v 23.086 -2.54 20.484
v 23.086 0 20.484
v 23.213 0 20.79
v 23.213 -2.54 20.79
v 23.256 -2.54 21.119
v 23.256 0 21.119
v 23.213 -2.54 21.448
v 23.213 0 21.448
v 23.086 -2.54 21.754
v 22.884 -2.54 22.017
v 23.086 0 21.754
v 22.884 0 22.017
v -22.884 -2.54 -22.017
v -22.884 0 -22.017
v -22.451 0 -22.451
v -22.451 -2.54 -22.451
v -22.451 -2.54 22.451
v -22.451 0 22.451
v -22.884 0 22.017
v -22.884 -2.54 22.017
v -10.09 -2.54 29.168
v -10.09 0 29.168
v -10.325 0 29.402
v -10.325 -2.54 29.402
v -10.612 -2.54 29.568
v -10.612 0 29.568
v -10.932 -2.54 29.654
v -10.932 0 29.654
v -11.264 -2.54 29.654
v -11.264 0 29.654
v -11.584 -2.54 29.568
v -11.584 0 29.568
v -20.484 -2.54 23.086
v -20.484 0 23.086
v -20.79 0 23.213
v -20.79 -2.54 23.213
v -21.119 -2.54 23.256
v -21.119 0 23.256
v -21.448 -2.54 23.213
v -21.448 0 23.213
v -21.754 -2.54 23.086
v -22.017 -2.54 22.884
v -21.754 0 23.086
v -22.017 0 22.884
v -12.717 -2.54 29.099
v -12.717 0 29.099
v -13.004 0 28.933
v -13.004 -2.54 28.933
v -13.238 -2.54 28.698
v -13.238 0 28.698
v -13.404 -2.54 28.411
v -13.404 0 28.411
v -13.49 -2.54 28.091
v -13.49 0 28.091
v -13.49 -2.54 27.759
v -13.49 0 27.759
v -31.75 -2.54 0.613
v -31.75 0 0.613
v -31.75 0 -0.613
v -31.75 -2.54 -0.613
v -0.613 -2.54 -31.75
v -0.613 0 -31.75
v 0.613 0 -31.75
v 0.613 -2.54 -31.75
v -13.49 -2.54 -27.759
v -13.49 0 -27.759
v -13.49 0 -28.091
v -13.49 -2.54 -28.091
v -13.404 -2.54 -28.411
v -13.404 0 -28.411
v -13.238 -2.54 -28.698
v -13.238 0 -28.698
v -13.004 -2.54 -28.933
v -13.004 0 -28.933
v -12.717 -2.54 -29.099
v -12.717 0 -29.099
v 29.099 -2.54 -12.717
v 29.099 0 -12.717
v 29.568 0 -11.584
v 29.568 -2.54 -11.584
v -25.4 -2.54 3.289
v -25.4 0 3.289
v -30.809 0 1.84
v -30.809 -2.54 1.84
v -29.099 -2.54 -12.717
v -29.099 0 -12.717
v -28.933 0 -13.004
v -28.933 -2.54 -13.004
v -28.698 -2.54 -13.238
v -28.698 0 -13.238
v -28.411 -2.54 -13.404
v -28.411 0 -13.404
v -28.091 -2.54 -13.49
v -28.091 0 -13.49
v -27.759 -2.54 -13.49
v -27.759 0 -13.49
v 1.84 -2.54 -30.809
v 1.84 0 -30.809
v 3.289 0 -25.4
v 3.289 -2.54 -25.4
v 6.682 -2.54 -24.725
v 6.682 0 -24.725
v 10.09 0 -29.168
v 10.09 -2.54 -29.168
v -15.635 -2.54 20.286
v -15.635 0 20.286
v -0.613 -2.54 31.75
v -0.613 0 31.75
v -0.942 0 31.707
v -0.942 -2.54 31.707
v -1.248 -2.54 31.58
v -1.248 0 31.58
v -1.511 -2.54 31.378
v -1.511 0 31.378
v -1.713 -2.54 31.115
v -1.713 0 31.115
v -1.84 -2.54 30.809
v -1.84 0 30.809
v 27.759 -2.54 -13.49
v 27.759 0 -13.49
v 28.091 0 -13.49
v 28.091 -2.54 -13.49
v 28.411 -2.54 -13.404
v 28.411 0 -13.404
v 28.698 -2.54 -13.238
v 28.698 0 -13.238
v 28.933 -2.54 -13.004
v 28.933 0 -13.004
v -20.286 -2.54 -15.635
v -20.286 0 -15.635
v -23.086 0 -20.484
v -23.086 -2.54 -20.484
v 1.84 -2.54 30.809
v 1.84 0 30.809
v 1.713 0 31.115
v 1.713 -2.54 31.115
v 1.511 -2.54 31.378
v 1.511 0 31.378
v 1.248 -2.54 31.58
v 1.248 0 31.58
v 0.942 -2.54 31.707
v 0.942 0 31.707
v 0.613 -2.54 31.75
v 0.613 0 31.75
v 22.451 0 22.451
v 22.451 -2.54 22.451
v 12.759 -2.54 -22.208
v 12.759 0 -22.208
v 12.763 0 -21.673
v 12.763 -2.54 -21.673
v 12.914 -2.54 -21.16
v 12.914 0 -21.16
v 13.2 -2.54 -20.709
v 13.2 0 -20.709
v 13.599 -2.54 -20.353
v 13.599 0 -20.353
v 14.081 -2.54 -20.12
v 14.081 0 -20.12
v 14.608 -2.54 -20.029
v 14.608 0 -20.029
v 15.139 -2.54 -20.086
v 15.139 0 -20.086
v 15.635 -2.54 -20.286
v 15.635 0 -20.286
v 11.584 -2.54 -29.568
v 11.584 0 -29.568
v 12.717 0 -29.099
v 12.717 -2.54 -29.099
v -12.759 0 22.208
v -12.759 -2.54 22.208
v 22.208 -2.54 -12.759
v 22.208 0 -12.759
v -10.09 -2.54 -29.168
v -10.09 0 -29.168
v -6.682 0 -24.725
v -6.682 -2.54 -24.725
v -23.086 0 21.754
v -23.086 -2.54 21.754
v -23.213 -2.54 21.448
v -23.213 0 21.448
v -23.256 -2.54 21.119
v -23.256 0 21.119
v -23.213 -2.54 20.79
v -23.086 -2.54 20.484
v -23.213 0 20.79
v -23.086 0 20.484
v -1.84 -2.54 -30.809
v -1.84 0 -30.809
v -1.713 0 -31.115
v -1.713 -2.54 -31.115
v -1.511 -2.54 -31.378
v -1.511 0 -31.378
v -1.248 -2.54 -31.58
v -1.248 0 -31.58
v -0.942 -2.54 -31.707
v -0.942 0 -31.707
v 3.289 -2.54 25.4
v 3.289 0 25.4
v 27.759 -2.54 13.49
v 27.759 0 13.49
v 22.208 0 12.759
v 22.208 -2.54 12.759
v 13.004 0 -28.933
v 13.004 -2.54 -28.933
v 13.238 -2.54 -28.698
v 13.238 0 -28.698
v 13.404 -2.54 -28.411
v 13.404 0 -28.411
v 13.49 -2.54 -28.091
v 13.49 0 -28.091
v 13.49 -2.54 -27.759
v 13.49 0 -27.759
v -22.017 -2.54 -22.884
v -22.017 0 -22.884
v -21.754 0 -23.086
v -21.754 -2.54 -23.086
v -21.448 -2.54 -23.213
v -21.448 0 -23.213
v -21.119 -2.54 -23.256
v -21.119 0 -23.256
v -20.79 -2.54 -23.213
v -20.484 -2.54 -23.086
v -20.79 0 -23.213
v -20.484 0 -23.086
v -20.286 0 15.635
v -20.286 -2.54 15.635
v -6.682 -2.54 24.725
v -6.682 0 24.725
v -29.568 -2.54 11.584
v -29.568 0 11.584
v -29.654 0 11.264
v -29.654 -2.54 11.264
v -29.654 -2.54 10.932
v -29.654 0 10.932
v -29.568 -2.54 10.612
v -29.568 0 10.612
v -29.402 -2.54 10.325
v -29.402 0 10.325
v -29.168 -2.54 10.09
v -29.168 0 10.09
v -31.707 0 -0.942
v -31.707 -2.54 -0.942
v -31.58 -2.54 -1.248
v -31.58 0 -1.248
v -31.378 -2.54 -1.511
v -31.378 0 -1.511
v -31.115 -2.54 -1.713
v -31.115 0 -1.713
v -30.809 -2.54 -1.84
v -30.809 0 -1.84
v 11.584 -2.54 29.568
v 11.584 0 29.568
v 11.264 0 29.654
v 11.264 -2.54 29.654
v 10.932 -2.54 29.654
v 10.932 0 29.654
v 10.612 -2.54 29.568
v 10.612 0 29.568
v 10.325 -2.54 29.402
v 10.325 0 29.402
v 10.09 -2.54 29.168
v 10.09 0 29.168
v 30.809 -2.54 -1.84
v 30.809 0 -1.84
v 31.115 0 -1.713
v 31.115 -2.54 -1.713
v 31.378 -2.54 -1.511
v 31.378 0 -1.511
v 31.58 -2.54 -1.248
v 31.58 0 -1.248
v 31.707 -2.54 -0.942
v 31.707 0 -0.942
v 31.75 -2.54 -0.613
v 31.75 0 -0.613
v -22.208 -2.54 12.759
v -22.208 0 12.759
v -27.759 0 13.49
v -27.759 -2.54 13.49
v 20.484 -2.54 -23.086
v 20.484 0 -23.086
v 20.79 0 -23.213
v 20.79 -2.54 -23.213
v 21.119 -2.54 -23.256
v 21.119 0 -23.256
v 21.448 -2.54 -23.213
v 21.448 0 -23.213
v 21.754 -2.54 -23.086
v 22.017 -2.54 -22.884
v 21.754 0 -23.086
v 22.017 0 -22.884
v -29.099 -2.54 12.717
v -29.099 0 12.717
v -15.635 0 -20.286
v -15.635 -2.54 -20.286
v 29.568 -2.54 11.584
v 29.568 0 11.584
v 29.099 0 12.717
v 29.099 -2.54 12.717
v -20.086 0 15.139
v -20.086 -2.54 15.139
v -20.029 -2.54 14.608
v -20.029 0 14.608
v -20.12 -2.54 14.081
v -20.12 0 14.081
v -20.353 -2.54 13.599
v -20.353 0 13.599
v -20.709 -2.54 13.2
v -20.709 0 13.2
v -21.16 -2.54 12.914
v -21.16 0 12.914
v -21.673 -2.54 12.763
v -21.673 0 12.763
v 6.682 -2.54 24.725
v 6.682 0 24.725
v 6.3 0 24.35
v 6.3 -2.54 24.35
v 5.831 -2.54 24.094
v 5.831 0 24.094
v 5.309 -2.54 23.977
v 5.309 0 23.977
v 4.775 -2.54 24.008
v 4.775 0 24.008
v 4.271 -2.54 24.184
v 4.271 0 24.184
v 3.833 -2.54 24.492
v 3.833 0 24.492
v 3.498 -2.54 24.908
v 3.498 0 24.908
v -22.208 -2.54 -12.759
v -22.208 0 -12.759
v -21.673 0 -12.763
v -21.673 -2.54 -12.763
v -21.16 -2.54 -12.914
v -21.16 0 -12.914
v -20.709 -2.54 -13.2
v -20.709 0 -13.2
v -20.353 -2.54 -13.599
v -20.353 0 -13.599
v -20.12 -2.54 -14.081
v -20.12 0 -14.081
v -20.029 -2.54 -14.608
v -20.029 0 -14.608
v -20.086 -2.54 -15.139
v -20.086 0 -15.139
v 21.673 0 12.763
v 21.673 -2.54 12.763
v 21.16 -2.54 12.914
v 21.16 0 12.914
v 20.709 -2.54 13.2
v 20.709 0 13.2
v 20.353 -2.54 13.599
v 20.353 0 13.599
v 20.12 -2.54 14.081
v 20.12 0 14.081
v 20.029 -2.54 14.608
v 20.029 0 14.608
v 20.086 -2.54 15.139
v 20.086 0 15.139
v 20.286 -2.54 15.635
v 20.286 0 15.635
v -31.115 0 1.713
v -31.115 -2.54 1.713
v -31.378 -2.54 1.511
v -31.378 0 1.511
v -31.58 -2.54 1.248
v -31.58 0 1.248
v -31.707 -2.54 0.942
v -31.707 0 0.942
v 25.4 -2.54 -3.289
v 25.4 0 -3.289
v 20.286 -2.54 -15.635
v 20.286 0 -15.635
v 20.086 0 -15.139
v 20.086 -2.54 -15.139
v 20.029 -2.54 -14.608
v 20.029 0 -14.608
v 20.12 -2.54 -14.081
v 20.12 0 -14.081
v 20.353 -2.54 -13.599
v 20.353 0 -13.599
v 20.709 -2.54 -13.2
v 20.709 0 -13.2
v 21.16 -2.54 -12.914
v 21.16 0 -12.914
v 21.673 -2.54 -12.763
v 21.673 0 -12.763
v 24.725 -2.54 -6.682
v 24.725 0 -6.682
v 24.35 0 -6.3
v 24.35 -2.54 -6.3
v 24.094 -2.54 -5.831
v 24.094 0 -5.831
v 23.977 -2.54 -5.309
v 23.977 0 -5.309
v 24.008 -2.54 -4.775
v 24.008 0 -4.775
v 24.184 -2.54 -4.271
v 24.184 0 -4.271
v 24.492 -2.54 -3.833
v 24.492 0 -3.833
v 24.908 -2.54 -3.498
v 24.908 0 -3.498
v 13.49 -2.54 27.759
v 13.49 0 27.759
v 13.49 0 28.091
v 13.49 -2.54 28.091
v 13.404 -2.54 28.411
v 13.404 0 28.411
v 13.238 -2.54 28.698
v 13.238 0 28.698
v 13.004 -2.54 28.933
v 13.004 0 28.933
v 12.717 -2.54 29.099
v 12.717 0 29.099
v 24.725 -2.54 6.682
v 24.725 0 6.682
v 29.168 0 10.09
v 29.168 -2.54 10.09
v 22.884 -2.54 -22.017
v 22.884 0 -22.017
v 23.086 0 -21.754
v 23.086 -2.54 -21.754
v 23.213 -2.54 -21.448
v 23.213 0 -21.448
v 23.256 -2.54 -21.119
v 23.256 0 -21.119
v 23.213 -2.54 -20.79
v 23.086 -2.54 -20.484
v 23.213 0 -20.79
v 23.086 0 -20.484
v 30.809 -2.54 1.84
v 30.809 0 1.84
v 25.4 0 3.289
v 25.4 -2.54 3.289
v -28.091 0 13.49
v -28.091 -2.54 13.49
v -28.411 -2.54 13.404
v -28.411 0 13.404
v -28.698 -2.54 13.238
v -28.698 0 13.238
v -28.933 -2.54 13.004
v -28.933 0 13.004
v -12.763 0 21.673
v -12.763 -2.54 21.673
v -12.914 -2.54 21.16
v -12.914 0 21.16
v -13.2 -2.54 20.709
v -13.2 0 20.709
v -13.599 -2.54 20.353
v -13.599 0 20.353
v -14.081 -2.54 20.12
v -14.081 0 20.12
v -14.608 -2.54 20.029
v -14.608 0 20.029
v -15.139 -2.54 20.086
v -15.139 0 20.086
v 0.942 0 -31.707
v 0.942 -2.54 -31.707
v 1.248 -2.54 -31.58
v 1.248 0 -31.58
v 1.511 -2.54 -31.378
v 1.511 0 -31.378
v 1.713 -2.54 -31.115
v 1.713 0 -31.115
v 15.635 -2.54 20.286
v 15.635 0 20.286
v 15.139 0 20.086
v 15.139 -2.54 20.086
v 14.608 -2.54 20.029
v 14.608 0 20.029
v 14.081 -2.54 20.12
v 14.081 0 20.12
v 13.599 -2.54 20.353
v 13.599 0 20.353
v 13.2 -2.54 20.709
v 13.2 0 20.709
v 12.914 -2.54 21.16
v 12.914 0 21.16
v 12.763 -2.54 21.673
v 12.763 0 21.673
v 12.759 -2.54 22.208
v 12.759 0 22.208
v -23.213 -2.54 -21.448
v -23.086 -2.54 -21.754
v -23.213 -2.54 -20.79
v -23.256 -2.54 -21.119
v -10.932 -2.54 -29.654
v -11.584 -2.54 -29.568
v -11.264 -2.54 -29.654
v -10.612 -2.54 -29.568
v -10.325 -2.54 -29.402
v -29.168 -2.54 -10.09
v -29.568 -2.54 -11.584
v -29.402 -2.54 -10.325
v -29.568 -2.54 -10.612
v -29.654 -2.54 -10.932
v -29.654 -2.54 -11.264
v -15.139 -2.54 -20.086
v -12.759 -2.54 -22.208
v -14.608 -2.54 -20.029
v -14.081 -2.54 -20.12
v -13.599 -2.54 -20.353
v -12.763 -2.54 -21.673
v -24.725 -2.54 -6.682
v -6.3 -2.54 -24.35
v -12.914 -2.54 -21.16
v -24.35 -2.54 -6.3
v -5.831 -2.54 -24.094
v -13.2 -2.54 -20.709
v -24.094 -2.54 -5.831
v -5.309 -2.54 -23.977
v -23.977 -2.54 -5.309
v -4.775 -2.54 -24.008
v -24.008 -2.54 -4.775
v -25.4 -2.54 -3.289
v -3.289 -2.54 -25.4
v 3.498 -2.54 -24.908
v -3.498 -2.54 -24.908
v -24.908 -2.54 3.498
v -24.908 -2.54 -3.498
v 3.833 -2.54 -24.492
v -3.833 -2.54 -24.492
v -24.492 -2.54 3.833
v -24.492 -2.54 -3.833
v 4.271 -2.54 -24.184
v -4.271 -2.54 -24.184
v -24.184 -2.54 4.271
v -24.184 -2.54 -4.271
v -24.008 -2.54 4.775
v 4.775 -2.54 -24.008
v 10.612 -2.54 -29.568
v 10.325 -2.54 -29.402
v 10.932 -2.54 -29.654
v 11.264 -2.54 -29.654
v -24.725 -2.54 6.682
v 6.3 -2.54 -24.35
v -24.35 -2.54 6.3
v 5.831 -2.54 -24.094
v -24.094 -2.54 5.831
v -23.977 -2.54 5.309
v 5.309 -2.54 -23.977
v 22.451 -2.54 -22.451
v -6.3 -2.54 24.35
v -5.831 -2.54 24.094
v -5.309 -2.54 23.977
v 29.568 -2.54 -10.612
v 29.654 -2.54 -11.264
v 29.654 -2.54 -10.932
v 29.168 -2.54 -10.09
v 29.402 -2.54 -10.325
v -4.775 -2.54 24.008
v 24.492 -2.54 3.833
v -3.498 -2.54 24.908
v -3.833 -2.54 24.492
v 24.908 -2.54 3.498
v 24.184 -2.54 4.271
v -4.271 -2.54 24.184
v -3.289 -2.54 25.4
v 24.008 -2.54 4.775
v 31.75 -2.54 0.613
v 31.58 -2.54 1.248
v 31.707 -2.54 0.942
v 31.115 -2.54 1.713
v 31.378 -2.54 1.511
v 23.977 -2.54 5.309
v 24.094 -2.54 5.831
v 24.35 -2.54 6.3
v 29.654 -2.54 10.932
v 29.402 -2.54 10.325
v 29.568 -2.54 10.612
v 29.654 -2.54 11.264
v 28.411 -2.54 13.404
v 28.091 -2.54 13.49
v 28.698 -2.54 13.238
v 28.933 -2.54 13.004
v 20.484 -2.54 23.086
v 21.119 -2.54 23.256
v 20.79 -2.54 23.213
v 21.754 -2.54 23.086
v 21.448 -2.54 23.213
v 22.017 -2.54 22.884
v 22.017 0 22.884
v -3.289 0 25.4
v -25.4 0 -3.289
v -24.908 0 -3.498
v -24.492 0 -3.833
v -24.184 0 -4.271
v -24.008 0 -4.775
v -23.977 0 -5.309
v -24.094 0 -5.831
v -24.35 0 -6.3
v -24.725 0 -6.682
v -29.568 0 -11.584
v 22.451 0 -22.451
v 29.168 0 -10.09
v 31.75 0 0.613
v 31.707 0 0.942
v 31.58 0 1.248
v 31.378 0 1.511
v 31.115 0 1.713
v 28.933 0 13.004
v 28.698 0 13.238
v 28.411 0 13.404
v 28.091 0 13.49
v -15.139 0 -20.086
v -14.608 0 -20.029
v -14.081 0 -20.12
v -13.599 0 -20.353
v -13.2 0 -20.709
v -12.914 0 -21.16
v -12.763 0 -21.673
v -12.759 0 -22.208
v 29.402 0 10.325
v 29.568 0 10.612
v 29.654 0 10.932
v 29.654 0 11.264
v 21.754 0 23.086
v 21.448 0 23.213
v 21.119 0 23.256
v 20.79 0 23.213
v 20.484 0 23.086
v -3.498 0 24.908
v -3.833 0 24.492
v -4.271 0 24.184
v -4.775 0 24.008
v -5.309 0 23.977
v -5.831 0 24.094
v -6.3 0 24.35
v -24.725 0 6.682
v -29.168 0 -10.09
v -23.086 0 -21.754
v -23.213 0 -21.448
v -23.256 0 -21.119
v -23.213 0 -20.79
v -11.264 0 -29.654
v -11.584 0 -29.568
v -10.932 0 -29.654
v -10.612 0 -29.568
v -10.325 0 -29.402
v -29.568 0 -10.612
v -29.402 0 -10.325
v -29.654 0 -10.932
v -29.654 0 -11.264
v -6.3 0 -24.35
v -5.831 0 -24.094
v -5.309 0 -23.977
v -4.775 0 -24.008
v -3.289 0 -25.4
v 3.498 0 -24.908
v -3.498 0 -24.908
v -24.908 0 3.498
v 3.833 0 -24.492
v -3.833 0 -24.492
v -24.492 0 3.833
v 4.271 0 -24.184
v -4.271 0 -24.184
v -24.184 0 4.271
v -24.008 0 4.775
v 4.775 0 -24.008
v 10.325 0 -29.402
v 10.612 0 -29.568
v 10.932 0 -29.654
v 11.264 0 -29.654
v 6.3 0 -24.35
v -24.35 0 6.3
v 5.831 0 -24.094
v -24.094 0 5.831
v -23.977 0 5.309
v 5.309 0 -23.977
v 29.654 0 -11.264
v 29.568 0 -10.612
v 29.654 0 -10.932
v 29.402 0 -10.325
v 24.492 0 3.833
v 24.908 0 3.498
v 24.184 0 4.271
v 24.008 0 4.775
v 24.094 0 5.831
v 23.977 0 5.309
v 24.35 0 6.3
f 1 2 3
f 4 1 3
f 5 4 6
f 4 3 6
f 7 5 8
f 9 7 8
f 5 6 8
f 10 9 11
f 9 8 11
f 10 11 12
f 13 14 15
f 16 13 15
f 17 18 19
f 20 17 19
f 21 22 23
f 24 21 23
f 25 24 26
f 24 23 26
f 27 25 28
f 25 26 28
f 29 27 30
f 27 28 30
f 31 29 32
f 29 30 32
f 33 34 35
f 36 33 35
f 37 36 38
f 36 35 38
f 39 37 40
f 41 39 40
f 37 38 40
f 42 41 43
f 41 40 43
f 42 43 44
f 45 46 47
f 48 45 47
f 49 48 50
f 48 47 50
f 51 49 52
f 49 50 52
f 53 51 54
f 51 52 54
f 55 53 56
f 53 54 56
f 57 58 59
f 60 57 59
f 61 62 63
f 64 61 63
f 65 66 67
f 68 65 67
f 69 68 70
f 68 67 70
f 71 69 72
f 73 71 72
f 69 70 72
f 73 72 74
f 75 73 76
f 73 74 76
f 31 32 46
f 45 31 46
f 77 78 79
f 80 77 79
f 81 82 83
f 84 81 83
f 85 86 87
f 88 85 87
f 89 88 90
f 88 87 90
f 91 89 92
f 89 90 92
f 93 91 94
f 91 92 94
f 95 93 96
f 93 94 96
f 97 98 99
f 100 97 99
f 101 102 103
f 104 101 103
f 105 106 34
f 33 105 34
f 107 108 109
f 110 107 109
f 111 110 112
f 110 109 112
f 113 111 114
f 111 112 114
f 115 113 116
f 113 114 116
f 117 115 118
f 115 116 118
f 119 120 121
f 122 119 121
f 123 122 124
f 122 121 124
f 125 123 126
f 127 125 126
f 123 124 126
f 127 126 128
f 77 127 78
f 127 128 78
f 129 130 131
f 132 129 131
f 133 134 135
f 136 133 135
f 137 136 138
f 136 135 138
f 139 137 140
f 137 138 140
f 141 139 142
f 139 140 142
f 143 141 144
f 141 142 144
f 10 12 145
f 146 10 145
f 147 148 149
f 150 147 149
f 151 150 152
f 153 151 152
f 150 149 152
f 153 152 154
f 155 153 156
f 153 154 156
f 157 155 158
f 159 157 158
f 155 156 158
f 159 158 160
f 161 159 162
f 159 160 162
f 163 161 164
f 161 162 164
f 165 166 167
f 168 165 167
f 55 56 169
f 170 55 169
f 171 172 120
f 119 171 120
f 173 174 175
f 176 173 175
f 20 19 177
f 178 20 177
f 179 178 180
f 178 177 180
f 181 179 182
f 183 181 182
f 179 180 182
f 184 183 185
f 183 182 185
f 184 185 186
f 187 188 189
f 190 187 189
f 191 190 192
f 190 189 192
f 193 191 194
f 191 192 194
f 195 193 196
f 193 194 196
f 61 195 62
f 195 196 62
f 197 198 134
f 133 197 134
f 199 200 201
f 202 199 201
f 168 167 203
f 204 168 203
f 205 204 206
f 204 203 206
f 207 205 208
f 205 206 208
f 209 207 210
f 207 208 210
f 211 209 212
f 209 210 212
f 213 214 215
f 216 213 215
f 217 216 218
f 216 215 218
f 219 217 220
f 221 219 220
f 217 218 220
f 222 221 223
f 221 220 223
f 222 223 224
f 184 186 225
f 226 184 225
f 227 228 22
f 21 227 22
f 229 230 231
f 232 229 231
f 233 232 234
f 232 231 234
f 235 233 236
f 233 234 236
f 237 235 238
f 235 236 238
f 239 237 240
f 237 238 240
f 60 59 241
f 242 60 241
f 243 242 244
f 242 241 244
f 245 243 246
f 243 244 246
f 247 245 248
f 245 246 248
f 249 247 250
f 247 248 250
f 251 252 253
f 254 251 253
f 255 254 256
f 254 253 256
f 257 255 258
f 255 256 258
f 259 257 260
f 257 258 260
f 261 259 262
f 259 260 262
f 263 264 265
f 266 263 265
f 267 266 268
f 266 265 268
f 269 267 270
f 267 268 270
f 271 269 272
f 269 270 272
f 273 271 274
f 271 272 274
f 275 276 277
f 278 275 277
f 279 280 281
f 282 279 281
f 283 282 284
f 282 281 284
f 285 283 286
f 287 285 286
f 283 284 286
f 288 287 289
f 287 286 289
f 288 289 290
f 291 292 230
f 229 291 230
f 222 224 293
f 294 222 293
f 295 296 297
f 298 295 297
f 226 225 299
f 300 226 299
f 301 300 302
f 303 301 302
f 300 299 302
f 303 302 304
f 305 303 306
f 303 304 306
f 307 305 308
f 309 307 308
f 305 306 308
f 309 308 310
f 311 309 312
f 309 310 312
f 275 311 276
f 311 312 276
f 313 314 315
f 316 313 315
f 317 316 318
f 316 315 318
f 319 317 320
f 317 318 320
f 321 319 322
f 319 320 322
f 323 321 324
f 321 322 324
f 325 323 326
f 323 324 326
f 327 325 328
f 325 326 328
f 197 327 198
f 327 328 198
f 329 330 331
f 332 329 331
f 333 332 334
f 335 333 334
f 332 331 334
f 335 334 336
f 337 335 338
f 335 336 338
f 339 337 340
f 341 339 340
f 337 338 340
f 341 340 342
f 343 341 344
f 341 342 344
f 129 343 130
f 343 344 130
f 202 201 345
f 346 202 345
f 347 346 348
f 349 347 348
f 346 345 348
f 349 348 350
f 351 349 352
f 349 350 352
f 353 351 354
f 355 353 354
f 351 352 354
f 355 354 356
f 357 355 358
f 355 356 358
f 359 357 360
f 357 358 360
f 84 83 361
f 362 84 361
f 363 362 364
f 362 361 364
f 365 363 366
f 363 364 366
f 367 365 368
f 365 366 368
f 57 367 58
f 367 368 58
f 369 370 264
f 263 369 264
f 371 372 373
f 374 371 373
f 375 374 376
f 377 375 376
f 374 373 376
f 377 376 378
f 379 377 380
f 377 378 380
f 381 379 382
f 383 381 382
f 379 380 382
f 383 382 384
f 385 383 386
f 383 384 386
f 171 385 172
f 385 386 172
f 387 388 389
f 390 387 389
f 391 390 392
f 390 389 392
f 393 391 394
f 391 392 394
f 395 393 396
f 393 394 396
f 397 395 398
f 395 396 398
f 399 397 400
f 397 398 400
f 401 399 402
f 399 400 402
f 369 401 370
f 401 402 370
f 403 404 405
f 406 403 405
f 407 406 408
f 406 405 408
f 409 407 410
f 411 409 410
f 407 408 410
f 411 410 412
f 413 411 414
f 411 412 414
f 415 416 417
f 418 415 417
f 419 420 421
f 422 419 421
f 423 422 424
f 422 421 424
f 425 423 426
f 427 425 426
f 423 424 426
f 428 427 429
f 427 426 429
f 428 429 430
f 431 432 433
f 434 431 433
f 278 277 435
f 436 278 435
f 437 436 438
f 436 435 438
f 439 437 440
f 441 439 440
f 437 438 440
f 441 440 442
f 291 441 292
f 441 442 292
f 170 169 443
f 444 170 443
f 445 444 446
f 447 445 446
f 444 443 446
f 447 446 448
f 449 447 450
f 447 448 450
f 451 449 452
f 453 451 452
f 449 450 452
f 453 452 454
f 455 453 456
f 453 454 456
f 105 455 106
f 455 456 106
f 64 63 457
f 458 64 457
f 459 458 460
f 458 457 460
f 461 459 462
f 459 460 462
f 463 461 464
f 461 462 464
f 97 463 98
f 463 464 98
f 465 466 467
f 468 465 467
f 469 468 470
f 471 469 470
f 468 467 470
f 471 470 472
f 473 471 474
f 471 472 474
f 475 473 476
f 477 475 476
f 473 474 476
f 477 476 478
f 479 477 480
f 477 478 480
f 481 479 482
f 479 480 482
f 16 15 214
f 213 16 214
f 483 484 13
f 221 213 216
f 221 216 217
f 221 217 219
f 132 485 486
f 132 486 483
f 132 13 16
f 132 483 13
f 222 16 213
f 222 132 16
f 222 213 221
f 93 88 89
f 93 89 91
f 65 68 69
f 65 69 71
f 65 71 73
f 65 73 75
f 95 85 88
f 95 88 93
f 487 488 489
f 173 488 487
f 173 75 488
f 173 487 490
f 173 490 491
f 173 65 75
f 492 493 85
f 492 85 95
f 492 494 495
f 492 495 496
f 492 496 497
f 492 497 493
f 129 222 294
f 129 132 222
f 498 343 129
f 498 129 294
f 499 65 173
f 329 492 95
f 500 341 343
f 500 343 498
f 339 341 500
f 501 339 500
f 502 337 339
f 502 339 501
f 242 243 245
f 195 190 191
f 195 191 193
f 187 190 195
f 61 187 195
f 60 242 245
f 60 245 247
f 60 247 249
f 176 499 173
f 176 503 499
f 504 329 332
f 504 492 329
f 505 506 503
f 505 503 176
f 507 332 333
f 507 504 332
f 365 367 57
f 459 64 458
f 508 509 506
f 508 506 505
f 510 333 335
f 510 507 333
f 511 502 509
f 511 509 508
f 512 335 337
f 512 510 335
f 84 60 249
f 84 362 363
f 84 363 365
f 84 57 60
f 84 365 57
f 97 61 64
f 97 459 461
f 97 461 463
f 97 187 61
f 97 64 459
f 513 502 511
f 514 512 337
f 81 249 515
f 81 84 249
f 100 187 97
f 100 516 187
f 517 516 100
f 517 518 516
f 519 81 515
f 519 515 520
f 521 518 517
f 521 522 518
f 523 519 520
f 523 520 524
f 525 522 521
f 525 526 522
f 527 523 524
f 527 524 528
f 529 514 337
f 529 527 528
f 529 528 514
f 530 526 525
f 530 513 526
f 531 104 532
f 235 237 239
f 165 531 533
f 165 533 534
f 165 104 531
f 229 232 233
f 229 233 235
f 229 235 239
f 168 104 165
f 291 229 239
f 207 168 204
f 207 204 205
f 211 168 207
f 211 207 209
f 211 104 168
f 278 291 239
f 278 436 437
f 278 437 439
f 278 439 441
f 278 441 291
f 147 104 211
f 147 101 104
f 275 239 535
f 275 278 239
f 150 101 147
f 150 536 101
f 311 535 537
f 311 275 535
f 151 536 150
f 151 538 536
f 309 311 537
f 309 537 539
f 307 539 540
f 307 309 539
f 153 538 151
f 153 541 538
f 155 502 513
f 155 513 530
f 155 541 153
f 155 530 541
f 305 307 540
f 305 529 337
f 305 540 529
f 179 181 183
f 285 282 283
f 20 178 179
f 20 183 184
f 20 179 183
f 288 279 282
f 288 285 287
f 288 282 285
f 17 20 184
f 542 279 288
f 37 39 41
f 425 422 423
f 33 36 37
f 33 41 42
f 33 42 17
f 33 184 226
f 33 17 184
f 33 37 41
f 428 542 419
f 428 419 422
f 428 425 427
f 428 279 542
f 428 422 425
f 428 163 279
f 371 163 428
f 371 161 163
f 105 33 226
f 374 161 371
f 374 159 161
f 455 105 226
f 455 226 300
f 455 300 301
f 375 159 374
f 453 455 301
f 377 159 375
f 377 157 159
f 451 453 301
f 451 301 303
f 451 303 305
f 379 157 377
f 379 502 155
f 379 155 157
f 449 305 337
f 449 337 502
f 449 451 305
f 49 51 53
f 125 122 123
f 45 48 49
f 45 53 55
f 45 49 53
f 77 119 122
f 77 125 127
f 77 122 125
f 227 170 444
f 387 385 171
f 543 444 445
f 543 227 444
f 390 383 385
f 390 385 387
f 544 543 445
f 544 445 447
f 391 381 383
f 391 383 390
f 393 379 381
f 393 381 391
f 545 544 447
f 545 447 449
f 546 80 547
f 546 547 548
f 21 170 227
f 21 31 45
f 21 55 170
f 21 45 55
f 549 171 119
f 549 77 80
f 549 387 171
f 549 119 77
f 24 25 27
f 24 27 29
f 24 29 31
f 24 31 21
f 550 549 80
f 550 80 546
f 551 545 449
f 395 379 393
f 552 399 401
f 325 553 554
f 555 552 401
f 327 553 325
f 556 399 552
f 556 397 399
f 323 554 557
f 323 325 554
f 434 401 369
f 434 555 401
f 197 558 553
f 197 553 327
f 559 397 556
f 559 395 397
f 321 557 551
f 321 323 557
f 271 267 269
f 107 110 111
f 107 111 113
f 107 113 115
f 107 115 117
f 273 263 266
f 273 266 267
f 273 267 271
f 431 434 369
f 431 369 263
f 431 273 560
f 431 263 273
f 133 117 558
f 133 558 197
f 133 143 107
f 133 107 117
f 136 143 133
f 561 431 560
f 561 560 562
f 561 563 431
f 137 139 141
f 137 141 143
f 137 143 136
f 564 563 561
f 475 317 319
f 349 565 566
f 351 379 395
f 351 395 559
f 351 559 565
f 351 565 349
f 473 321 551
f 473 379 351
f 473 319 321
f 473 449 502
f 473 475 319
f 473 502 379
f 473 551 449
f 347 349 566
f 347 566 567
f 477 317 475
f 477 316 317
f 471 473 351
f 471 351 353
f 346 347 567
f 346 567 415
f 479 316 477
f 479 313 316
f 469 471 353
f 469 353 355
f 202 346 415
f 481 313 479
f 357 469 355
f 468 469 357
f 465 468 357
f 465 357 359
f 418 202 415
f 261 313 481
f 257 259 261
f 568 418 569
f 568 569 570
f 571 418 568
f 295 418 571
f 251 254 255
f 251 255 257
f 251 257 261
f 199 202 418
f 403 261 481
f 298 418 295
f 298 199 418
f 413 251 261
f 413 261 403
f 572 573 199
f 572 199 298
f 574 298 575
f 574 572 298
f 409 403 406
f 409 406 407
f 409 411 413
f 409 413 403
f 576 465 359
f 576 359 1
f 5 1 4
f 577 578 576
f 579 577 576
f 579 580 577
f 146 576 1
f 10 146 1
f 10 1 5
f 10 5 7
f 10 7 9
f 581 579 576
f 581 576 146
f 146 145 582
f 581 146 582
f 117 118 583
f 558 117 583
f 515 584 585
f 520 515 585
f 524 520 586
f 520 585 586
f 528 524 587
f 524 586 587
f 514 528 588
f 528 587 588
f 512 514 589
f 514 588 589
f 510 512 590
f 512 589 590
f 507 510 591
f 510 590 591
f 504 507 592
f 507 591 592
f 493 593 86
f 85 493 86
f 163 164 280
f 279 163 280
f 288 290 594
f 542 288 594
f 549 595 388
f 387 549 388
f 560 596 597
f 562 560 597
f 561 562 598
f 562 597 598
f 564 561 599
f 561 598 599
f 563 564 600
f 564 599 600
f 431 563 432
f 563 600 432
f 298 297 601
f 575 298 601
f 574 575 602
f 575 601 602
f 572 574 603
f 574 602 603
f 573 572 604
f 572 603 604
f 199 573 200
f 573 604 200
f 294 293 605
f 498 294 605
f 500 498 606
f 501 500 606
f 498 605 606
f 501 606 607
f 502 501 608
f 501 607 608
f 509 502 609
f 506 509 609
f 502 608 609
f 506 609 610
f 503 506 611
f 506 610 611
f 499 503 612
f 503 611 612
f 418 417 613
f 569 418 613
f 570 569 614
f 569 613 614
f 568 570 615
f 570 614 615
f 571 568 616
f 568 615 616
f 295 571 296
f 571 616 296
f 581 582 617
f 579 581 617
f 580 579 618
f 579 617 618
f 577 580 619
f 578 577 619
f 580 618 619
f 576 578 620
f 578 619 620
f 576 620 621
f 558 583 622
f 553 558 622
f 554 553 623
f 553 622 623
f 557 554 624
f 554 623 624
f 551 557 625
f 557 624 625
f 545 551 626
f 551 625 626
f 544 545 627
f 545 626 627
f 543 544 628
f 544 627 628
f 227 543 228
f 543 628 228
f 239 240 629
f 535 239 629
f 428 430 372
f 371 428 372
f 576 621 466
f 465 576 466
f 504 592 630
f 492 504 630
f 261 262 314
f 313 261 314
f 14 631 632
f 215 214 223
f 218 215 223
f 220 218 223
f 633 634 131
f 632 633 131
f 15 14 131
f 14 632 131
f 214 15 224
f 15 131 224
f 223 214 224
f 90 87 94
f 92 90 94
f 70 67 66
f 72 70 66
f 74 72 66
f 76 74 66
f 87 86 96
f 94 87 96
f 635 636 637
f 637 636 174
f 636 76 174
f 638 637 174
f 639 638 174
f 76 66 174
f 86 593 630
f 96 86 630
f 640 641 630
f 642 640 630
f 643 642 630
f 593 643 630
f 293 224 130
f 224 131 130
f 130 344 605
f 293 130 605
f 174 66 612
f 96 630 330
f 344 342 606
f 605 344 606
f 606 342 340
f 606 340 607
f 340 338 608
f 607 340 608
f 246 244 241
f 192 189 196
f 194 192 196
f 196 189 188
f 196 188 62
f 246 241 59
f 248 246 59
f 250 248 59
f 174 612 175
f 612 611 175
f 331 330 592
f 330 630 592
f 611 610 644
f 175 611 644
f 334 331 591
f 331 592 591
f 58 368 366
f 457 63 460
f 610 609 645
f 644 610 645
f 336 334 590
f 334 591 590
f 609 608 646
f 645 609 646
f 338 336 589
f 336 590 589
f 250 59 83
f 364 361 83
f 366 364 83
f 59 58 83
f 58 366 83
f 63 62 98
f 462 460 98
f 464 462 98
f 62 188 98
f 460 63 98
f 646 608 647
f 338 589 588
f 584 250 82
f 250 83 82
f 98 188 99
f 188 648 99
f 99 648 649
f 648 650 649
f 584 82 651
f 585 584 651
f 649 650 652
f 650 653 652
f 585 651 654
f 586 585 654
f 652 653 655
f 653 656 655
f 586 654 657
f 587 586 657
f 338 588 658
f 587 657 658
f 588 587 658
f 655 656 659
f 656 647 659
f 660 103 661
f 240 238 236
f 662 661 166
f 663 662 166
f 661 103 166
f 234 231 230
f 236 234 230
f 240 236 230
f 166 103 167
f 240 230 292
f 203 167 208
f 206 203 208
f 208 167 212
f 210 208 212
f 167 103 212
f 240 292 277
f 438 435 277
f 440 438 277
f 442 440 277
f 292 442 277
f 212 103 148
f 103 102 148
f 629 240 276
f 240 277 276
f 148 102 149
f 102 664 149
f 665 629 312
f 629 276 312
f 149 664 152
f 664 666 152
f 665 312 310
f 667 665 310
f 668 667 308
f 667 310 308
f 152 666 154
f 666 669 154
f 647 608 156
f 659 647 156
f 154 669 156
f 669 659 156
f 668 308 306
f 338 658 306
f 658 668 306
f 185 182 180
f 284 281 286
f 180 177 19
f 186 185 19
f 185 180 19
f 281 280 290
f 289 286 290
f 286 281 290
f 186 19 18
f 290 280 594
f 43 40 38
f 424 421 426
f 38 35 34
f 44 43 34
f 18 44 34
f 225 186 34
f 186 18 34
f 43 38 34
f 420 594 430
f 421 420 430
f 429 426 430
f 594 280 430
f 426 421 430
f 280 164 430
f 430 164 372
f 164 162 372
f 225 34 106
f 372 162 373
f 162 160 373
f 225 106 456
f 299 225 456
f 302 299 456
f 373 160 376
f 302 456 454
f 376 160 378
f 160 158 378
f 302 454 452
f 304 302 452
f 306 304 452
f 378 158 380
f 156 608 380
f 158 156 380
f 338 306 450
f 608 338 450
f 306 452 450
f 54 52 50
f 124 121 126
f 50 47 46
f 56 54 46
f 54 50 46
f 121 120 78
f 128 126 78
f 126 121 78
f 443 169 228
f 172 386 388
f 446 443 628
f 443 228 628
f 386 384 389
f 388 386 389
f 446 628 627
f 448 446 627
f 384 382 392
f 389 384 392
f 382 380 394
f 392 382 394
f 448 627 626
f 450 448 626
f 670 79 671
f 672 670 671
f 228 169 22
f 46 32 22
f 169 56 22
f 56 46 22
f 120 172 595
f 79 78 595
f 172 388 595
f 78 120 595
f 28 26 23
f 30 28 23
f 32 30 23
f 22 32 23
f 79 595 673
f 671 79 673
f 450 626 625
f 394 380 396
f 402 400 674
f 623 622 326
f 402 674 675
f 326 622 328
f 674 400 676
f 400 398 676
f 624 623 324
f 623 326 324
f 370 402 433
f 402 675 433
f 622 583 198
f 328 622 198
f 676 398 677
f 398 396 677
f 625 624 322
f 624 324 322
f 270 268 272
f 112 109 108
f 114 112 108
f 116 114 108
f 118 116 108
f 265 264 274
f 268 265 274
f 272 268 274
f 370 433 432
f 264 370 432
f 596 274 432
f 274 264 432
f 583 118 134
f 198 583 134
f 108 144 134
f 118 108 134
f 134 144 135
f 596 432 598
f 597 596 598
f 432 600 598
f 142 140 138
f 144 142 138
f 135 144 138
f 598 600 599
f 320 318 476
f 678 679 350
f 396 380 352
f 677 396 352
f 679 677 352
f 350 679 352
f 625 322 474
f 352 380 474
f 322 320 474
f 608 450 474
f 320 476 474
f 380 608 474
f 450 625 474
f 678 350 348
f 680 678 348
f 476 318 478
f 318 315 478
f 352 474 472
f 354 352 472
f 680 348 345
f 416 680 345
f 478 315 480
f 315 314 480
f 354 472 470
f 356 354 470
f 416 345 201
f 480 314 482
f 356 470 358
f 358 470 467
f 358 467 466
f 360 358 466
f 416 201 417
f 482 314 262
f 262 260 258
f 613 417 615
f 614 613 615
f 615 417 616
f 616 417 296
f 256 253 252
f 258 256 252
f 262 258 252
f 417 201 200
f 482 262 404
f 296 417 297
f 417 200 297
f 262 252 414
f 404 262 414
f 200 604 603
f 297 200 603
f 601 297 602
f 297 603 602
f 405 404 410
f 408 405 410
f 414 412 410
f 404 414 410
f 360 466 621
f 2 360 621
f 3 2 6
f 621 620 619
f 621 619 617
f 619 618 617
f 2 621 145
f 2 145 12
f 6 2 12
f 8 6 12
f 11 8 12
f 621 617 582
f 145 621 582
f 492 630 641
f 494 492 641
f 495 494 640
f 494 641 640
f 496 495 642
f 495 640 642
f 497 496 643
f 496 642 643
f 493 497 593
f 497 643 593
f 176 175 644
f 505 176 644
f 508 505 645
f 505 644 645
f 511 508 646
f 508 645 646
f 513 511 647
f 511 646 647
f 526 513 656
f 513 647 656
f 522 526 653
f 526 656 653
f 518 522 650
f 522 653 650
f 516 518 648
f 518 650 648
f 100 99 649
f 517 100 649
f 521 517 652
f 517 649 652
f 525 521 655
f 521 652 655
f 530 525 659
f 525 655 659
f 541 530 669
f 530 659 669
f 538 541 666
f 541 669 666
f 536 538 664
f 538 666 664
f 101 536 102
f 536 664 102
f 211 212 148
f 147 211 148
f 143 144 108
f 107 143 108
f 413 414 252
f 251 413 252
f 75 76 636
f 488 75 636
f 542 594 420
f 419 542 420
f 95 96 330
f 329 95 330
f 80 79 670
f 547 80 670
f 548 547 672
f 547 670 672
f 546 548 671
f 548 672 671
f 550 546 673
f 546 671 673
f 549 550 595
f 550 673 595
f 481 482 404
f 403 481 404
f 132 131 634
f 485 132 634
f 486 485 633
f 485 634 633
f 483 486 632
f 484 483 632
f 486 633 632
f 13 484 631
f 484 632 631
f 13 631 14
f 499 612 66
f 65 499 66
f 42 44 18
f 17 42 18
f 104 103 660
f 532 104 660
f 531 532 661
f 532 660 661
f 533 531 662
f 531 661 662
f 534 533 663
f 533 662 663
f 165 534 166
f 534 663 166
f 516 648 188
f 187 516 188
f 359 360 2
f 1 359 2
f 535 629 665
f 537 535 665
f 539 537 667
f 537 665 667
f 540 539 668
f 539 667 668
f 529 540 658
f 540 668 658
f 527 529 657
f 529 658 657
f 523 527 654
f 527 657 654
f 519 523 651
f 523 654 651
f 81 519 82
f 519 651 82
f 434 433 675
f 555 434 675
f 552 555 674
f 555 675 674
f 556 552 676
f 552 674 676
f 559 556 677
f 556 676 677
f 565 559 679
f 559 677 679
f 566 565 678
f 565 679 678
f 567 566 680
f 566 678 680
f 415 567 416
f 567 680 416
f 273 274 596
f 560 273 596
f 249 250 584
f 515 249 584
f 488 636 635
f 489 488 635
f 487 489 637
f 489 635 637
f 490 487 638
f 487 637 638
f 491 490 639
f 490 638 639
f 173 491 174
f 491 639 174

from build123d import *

# Parameters (mm, degrees)
F1_DEPTH = 2.54


with BuildPart() as f1:
    # F0 (on Front) → F1 (new body)
    with BuildSketch(Plane.XZ):
        with BuildLine():
            Line((-1.839721, 30.8087), (-3.288977, 25.4))
            ThreePointArc((-3.288977, 25.4), (-4.775443, 24.007773), (-6.68154, 24.725177))
            Line((-6.68154, 24.725177), (-10.090299, 29.167558))
            ThreePointArc((-10.090299, 29.167558), (-10.769158, 29.621157), (-11.583866, 29.567758))
            Line((-11.583866, 29.567758), (-12.150199, 29.333175))
            Line((-12.150199, 29.333175), (-12.716532, 29.098592))
            ThreePointArc((-12.716532, 29.098592), (-13.330377, 28.560265), (-13.489659, 27.759497))
            Line((-13.489659, 27.759497), (-12.758778, 22.207903))
            ThreePointArc((-12.758778, 22.207903), (-13.599311, 20.352807), (-15.634854, 20.28617))
            Line((-15.634854, 20.28617), (-20.484162, 23.08592))
            ThreePointArc((-20.484162, 23.08592), (-21.28493, 23.245202), (-22.017188, 22.884093))
            Line((-22.017188, 22.884093), (-22.45064, 22.45064))
            Line((-22.45064, 22.45064), (-22.884093, 22.017188))
            ThreePointArc((-22.884093, 22.017188), (-23.245202, 21.28493), (-23.08592, 20.484162))
            Line((-23.08592, 20.484162), (-20.28617, 15.634854))
            ThreePointArc((-20.28617, 15.634854), (-20.352807, 13.599311), (-22.207903, 12.758778))
            Line((-22.207903, 12.758778), (-27.759497, 13.489659))
            ThreePointArc((-27.759497, 13.489659), (-28.560265, 13.330377), (-29.098592, 12.716532))
            Line((-29.098592, 12.716532), (-29.333175, 12.150199))
            Line((-29.333175, 12.150199), (-29.567758, 11.583866))
            ThreePointArc((-29.567758, 11.583866), (-29.621157, 10.769158), (-29.167558, 10.090299))
            Line((-29.167558, 10.090299), (-24.725177, 6.68154))
            ThreePointArc((-24.725177, 6.68154), (-24.007773, 4.775443), (-25.4, 3.288977))
            Line((-25.4, 3.288977), (-30.8087, 1.839721))
            ThreePointArc((-30.8087, 1.839721), (-31.487559, 1.386122), (-31.75, 0.612995))
            Line((-31.75, 0.612995), (-31.75, 0))
            Line((-31.75, 0), (-31.75, -0.612995))
            ThreePointArc((-31.75, -0.612995), (-31.487559, -1.386122), (-30.8087, -1.839721))
            Line((-30.8087, -1.839721), (-25.4, -3.288977))
            ThreePointArc((-25.4, -3.288977), (-24.007773, -4.775443), (-24.725177, -6.68154))
            Line((-24.725177, -6.68154), (-29.167558, -10.090299))
            ThreePointArc((-29.167558, -10.090299), (-29.621157, -10.769158), (-29.567758, -11.583866))
            Line((-29.567758, -11.583866), (-29.333175, -12.150199))
            Line((-29.333175, -12.150199), (-29.098592, -12.716532))
            ThreePointArc((-29.098592, -12.716532), (-28.560265, -13.330377), (-27.759497, -13.489659))
            Line((-27.759497, -13.489659), (-22.207903, -12.758778))
            ThreePointArc((-22.207903, -12.758778), (-20.352807, -13.599311), (-20.28617, -15.634854))
            Line((-20.28617, -15.634854), (-23.08592, -20.484162))
            ThreePointArc((-23.08592, -20.484162), (-23.245202, -21.28493), (-22.884093, -22.017188))
            Line((-22.884093, -22.017188), (-22.45064, -22.45064))
            Line((-22.45064, -22.45064), (-22.017188, -22.884093))
            ThreePointArc((-22.017188, -22.884093), (-21.28493, -23.245202), (-20.484162, -23.08592))
            Line((-20.484162, -23.08592), (-15.634854, -20.28617))
            ThreePointArc((-15.634854, -20.28617), (-13.599311, -20.352807), (-12.758778, -22.207903))
            Line((-12.758778, -22.207903), (-13.489659, -27.759497))
            ThreePointArc((-13.489659, -27.759497), (-13.330377, -28.560265), (-12.716532, -29.098592))
            Line((-12.716532, -29.098592), (-12.150199, -29.333175))
            Line((-12.150199, -29.333175), (-11.583866, -29.567758))
            ThreePointArc((-11.583866, -29.567758), (-10.769158, -29.621157), (-10.090299, -29.167558))
            Line((-10.090299, -29.167558), (-6.68154, -24.725177))
            ThreePointArc((-6.68154, -24.725177), (-4.775443, -24.007773), (-3.288977, -25.4))
            Line((-3.288977, -25.4), (-1.839721, -30.8087))
            ThreePointArc((-1.839721, -30.8087), (-1.386122, -31.487559), (-0.612995, -31.75))
            Line((-0.612995, -31.75), (0, -31.75))
            Line((0, -31.75), (0.612995, -31.75))
            ThreePointArc((0.612995, -31.75), (1.386122, -31.487559), (1.839721, -30.8087))
            Line((1.839721, -30.8087), (3.288977, -25.4))
            ThreePointArc((3.288977, -25.4), (4.775443, -24.007773), (6.68154, -24.725177))
            Line((6.68154, -24.725177), (10.090299, -29.167558))
            ThreePointArc((10.090299, -29.167558), (10.769158, -29.621157), (11.583866, -29.567758))
            Line((11.583866, -29.567758), (12.150199, -29.333175))
            Line((12.150199, -29.333175), (12.716532, -29.098592))
            ThreePointArc((12.716532, -29.098592), (13.330377, -28.560265), (13.489659, -27.759497))
            Line((13.489659, -27.759497), (12.758778, -22.207903))
            ThreePointArc((12.758778, -22.207903), (13.599311, -20.352807), (15.634854, -20.28617))
            Line((15.634854, -20.28617), (20.484162, -23.08592))
            ThreePointArc((20.484162, -23.08592), (21.28493, -23.245202), (22.017188, -22.884093))
            Line((22.017188, -22.884093), (22.45064, -22.45064))
            Line((22.45064, -22.45064), (22.884093, -22.017188))
            ThreePointArc((22.884093, -22.017188), (23.245202, -21.28493), (23.08592, -20.484162))
            Line((23.08592, -20.484162), (20.28617, -15.634854))
            ThreePointArc((20.28617, -15.634854), (20.352807, -13.599311), (22.207903, -12.758778))
            Line((22.207903, -12.758778), (27.759497, -13.489659))
            ThreePointArc((27.759497, -13.489659), (28.560265, -13.330377), (29.098592, -12.716532))
            Line((29.098592, -12.716532), (29.333175, -12.150199))
            Line((29.333175, -12.150199), (29.567758, -11.583866))
            ThreePointArc((29.567758, -11.583866), (29.621157, -10.769158), (29.167558, -10.090299))
            Line((29.167558, -10.090299), (24.725177, -6.68154))
            ThreePointArc((24.725177, -6.68154), (24.007773, -4.775443), (25.4, -3.288977))
            Line((25.4, -3.288977), (30.8087, -1.839721))
            ThreePointArc((30.8087, -1.839721), (31.487559, -1.386122), (31.75, -0.612995))
            Line((31.75, -0.612995), (31.75, 0))
            Line((31.75, 0), (31.75, 0.612995))
            ThreePointArc((31.75, 0.612995), (31.487559, 1.386122), (30.8087, 1.839721))
            Line((30.8087, 1.839721), (25.4, 3.288977))
            ThreePointArc((25.4, 3.288977), (24.007773, 4.775443), (24.725177, 6.68154))
            Line((24.725177, 6.68154), (29.167558, 10.090299))
            ThreePointArc((29.167558, 10.090299), (29.621157, 10.769158), (29.567758, 11.583866))
            Line((29.567758, 11.583866), (29.333175, 12.150199))
            Line((29.333175, 12.150199), (29.098592, 12.716532))
            ThreePointArc((29.098592, 12.716532), (28.560265, 13.330377), (27.759497, 13.489659))
            Line((27.759497, 13.489659), (22.207903, 12.758778))
            ThreePointArc((22.207903, 12.758778), (20.352807, 13.599311), (20.28617, 15.634854))
            Line((20.28617, 15.634854), (23.08592, 20.484162))
            ThreePointArc((23.08592, 20.484162), (23.245202, 21.28493), (22.884093, 22.017188))
            Line((22.884093, 22.017188), (22.45064, 22.45064))
            Line((22.45064, 22.45064), (22.017188, 22.884093))
            ThreePointArc((22.017188, 22.884093), (21.28493, 23.245202), (20.484162, 23.08592))
            Line((20.484162, 23.08592), (15.634854, 20.28617))
            ThreePointArc((15.634854, 20.28617), (13.599311, 20.352807), (12.758778, 22.207903))
            Line((12.758778, 22.207903), (13.489659, 27.759497))
            ThreePointArc((13.489659, 27.759497), (13.330377, 28.560265), (12.716532, 29.098592))
            Line((12.716532, 29.098592), (12.150199, 29.333175))
            Line((12.150199, 29.333175), (11.583866, 29.567758))
            ThreePointArc((11.583866, 29.567758), (10.769158, 29.621157), (10.090299, 29.167558))
            Line((10.090299, 29.167558), (6.68154, 24.725177))
            ThreePointArc((6.68154, 24.725177), (4.775443, 24.007773), (3.288977, 25.4))
            Line((3.288977, 25.4), (1.839721, 30.8087))
            ThreePointArc((1.839721, 30.8087), (1.386122, 31.487559), (0.612995, 31.75))
            Line((0.612995, 31.75), (0, 31.75))
            Line((0, 31.75), (-0.612995, 31.75))
            ThreePointArc((-0.612995, 31.75), (-1.386122, 31.487559), (-1.839721, 30.8087))
        make_face()
    extrude(amount=F1_DEPTH)


solid = f1.part
